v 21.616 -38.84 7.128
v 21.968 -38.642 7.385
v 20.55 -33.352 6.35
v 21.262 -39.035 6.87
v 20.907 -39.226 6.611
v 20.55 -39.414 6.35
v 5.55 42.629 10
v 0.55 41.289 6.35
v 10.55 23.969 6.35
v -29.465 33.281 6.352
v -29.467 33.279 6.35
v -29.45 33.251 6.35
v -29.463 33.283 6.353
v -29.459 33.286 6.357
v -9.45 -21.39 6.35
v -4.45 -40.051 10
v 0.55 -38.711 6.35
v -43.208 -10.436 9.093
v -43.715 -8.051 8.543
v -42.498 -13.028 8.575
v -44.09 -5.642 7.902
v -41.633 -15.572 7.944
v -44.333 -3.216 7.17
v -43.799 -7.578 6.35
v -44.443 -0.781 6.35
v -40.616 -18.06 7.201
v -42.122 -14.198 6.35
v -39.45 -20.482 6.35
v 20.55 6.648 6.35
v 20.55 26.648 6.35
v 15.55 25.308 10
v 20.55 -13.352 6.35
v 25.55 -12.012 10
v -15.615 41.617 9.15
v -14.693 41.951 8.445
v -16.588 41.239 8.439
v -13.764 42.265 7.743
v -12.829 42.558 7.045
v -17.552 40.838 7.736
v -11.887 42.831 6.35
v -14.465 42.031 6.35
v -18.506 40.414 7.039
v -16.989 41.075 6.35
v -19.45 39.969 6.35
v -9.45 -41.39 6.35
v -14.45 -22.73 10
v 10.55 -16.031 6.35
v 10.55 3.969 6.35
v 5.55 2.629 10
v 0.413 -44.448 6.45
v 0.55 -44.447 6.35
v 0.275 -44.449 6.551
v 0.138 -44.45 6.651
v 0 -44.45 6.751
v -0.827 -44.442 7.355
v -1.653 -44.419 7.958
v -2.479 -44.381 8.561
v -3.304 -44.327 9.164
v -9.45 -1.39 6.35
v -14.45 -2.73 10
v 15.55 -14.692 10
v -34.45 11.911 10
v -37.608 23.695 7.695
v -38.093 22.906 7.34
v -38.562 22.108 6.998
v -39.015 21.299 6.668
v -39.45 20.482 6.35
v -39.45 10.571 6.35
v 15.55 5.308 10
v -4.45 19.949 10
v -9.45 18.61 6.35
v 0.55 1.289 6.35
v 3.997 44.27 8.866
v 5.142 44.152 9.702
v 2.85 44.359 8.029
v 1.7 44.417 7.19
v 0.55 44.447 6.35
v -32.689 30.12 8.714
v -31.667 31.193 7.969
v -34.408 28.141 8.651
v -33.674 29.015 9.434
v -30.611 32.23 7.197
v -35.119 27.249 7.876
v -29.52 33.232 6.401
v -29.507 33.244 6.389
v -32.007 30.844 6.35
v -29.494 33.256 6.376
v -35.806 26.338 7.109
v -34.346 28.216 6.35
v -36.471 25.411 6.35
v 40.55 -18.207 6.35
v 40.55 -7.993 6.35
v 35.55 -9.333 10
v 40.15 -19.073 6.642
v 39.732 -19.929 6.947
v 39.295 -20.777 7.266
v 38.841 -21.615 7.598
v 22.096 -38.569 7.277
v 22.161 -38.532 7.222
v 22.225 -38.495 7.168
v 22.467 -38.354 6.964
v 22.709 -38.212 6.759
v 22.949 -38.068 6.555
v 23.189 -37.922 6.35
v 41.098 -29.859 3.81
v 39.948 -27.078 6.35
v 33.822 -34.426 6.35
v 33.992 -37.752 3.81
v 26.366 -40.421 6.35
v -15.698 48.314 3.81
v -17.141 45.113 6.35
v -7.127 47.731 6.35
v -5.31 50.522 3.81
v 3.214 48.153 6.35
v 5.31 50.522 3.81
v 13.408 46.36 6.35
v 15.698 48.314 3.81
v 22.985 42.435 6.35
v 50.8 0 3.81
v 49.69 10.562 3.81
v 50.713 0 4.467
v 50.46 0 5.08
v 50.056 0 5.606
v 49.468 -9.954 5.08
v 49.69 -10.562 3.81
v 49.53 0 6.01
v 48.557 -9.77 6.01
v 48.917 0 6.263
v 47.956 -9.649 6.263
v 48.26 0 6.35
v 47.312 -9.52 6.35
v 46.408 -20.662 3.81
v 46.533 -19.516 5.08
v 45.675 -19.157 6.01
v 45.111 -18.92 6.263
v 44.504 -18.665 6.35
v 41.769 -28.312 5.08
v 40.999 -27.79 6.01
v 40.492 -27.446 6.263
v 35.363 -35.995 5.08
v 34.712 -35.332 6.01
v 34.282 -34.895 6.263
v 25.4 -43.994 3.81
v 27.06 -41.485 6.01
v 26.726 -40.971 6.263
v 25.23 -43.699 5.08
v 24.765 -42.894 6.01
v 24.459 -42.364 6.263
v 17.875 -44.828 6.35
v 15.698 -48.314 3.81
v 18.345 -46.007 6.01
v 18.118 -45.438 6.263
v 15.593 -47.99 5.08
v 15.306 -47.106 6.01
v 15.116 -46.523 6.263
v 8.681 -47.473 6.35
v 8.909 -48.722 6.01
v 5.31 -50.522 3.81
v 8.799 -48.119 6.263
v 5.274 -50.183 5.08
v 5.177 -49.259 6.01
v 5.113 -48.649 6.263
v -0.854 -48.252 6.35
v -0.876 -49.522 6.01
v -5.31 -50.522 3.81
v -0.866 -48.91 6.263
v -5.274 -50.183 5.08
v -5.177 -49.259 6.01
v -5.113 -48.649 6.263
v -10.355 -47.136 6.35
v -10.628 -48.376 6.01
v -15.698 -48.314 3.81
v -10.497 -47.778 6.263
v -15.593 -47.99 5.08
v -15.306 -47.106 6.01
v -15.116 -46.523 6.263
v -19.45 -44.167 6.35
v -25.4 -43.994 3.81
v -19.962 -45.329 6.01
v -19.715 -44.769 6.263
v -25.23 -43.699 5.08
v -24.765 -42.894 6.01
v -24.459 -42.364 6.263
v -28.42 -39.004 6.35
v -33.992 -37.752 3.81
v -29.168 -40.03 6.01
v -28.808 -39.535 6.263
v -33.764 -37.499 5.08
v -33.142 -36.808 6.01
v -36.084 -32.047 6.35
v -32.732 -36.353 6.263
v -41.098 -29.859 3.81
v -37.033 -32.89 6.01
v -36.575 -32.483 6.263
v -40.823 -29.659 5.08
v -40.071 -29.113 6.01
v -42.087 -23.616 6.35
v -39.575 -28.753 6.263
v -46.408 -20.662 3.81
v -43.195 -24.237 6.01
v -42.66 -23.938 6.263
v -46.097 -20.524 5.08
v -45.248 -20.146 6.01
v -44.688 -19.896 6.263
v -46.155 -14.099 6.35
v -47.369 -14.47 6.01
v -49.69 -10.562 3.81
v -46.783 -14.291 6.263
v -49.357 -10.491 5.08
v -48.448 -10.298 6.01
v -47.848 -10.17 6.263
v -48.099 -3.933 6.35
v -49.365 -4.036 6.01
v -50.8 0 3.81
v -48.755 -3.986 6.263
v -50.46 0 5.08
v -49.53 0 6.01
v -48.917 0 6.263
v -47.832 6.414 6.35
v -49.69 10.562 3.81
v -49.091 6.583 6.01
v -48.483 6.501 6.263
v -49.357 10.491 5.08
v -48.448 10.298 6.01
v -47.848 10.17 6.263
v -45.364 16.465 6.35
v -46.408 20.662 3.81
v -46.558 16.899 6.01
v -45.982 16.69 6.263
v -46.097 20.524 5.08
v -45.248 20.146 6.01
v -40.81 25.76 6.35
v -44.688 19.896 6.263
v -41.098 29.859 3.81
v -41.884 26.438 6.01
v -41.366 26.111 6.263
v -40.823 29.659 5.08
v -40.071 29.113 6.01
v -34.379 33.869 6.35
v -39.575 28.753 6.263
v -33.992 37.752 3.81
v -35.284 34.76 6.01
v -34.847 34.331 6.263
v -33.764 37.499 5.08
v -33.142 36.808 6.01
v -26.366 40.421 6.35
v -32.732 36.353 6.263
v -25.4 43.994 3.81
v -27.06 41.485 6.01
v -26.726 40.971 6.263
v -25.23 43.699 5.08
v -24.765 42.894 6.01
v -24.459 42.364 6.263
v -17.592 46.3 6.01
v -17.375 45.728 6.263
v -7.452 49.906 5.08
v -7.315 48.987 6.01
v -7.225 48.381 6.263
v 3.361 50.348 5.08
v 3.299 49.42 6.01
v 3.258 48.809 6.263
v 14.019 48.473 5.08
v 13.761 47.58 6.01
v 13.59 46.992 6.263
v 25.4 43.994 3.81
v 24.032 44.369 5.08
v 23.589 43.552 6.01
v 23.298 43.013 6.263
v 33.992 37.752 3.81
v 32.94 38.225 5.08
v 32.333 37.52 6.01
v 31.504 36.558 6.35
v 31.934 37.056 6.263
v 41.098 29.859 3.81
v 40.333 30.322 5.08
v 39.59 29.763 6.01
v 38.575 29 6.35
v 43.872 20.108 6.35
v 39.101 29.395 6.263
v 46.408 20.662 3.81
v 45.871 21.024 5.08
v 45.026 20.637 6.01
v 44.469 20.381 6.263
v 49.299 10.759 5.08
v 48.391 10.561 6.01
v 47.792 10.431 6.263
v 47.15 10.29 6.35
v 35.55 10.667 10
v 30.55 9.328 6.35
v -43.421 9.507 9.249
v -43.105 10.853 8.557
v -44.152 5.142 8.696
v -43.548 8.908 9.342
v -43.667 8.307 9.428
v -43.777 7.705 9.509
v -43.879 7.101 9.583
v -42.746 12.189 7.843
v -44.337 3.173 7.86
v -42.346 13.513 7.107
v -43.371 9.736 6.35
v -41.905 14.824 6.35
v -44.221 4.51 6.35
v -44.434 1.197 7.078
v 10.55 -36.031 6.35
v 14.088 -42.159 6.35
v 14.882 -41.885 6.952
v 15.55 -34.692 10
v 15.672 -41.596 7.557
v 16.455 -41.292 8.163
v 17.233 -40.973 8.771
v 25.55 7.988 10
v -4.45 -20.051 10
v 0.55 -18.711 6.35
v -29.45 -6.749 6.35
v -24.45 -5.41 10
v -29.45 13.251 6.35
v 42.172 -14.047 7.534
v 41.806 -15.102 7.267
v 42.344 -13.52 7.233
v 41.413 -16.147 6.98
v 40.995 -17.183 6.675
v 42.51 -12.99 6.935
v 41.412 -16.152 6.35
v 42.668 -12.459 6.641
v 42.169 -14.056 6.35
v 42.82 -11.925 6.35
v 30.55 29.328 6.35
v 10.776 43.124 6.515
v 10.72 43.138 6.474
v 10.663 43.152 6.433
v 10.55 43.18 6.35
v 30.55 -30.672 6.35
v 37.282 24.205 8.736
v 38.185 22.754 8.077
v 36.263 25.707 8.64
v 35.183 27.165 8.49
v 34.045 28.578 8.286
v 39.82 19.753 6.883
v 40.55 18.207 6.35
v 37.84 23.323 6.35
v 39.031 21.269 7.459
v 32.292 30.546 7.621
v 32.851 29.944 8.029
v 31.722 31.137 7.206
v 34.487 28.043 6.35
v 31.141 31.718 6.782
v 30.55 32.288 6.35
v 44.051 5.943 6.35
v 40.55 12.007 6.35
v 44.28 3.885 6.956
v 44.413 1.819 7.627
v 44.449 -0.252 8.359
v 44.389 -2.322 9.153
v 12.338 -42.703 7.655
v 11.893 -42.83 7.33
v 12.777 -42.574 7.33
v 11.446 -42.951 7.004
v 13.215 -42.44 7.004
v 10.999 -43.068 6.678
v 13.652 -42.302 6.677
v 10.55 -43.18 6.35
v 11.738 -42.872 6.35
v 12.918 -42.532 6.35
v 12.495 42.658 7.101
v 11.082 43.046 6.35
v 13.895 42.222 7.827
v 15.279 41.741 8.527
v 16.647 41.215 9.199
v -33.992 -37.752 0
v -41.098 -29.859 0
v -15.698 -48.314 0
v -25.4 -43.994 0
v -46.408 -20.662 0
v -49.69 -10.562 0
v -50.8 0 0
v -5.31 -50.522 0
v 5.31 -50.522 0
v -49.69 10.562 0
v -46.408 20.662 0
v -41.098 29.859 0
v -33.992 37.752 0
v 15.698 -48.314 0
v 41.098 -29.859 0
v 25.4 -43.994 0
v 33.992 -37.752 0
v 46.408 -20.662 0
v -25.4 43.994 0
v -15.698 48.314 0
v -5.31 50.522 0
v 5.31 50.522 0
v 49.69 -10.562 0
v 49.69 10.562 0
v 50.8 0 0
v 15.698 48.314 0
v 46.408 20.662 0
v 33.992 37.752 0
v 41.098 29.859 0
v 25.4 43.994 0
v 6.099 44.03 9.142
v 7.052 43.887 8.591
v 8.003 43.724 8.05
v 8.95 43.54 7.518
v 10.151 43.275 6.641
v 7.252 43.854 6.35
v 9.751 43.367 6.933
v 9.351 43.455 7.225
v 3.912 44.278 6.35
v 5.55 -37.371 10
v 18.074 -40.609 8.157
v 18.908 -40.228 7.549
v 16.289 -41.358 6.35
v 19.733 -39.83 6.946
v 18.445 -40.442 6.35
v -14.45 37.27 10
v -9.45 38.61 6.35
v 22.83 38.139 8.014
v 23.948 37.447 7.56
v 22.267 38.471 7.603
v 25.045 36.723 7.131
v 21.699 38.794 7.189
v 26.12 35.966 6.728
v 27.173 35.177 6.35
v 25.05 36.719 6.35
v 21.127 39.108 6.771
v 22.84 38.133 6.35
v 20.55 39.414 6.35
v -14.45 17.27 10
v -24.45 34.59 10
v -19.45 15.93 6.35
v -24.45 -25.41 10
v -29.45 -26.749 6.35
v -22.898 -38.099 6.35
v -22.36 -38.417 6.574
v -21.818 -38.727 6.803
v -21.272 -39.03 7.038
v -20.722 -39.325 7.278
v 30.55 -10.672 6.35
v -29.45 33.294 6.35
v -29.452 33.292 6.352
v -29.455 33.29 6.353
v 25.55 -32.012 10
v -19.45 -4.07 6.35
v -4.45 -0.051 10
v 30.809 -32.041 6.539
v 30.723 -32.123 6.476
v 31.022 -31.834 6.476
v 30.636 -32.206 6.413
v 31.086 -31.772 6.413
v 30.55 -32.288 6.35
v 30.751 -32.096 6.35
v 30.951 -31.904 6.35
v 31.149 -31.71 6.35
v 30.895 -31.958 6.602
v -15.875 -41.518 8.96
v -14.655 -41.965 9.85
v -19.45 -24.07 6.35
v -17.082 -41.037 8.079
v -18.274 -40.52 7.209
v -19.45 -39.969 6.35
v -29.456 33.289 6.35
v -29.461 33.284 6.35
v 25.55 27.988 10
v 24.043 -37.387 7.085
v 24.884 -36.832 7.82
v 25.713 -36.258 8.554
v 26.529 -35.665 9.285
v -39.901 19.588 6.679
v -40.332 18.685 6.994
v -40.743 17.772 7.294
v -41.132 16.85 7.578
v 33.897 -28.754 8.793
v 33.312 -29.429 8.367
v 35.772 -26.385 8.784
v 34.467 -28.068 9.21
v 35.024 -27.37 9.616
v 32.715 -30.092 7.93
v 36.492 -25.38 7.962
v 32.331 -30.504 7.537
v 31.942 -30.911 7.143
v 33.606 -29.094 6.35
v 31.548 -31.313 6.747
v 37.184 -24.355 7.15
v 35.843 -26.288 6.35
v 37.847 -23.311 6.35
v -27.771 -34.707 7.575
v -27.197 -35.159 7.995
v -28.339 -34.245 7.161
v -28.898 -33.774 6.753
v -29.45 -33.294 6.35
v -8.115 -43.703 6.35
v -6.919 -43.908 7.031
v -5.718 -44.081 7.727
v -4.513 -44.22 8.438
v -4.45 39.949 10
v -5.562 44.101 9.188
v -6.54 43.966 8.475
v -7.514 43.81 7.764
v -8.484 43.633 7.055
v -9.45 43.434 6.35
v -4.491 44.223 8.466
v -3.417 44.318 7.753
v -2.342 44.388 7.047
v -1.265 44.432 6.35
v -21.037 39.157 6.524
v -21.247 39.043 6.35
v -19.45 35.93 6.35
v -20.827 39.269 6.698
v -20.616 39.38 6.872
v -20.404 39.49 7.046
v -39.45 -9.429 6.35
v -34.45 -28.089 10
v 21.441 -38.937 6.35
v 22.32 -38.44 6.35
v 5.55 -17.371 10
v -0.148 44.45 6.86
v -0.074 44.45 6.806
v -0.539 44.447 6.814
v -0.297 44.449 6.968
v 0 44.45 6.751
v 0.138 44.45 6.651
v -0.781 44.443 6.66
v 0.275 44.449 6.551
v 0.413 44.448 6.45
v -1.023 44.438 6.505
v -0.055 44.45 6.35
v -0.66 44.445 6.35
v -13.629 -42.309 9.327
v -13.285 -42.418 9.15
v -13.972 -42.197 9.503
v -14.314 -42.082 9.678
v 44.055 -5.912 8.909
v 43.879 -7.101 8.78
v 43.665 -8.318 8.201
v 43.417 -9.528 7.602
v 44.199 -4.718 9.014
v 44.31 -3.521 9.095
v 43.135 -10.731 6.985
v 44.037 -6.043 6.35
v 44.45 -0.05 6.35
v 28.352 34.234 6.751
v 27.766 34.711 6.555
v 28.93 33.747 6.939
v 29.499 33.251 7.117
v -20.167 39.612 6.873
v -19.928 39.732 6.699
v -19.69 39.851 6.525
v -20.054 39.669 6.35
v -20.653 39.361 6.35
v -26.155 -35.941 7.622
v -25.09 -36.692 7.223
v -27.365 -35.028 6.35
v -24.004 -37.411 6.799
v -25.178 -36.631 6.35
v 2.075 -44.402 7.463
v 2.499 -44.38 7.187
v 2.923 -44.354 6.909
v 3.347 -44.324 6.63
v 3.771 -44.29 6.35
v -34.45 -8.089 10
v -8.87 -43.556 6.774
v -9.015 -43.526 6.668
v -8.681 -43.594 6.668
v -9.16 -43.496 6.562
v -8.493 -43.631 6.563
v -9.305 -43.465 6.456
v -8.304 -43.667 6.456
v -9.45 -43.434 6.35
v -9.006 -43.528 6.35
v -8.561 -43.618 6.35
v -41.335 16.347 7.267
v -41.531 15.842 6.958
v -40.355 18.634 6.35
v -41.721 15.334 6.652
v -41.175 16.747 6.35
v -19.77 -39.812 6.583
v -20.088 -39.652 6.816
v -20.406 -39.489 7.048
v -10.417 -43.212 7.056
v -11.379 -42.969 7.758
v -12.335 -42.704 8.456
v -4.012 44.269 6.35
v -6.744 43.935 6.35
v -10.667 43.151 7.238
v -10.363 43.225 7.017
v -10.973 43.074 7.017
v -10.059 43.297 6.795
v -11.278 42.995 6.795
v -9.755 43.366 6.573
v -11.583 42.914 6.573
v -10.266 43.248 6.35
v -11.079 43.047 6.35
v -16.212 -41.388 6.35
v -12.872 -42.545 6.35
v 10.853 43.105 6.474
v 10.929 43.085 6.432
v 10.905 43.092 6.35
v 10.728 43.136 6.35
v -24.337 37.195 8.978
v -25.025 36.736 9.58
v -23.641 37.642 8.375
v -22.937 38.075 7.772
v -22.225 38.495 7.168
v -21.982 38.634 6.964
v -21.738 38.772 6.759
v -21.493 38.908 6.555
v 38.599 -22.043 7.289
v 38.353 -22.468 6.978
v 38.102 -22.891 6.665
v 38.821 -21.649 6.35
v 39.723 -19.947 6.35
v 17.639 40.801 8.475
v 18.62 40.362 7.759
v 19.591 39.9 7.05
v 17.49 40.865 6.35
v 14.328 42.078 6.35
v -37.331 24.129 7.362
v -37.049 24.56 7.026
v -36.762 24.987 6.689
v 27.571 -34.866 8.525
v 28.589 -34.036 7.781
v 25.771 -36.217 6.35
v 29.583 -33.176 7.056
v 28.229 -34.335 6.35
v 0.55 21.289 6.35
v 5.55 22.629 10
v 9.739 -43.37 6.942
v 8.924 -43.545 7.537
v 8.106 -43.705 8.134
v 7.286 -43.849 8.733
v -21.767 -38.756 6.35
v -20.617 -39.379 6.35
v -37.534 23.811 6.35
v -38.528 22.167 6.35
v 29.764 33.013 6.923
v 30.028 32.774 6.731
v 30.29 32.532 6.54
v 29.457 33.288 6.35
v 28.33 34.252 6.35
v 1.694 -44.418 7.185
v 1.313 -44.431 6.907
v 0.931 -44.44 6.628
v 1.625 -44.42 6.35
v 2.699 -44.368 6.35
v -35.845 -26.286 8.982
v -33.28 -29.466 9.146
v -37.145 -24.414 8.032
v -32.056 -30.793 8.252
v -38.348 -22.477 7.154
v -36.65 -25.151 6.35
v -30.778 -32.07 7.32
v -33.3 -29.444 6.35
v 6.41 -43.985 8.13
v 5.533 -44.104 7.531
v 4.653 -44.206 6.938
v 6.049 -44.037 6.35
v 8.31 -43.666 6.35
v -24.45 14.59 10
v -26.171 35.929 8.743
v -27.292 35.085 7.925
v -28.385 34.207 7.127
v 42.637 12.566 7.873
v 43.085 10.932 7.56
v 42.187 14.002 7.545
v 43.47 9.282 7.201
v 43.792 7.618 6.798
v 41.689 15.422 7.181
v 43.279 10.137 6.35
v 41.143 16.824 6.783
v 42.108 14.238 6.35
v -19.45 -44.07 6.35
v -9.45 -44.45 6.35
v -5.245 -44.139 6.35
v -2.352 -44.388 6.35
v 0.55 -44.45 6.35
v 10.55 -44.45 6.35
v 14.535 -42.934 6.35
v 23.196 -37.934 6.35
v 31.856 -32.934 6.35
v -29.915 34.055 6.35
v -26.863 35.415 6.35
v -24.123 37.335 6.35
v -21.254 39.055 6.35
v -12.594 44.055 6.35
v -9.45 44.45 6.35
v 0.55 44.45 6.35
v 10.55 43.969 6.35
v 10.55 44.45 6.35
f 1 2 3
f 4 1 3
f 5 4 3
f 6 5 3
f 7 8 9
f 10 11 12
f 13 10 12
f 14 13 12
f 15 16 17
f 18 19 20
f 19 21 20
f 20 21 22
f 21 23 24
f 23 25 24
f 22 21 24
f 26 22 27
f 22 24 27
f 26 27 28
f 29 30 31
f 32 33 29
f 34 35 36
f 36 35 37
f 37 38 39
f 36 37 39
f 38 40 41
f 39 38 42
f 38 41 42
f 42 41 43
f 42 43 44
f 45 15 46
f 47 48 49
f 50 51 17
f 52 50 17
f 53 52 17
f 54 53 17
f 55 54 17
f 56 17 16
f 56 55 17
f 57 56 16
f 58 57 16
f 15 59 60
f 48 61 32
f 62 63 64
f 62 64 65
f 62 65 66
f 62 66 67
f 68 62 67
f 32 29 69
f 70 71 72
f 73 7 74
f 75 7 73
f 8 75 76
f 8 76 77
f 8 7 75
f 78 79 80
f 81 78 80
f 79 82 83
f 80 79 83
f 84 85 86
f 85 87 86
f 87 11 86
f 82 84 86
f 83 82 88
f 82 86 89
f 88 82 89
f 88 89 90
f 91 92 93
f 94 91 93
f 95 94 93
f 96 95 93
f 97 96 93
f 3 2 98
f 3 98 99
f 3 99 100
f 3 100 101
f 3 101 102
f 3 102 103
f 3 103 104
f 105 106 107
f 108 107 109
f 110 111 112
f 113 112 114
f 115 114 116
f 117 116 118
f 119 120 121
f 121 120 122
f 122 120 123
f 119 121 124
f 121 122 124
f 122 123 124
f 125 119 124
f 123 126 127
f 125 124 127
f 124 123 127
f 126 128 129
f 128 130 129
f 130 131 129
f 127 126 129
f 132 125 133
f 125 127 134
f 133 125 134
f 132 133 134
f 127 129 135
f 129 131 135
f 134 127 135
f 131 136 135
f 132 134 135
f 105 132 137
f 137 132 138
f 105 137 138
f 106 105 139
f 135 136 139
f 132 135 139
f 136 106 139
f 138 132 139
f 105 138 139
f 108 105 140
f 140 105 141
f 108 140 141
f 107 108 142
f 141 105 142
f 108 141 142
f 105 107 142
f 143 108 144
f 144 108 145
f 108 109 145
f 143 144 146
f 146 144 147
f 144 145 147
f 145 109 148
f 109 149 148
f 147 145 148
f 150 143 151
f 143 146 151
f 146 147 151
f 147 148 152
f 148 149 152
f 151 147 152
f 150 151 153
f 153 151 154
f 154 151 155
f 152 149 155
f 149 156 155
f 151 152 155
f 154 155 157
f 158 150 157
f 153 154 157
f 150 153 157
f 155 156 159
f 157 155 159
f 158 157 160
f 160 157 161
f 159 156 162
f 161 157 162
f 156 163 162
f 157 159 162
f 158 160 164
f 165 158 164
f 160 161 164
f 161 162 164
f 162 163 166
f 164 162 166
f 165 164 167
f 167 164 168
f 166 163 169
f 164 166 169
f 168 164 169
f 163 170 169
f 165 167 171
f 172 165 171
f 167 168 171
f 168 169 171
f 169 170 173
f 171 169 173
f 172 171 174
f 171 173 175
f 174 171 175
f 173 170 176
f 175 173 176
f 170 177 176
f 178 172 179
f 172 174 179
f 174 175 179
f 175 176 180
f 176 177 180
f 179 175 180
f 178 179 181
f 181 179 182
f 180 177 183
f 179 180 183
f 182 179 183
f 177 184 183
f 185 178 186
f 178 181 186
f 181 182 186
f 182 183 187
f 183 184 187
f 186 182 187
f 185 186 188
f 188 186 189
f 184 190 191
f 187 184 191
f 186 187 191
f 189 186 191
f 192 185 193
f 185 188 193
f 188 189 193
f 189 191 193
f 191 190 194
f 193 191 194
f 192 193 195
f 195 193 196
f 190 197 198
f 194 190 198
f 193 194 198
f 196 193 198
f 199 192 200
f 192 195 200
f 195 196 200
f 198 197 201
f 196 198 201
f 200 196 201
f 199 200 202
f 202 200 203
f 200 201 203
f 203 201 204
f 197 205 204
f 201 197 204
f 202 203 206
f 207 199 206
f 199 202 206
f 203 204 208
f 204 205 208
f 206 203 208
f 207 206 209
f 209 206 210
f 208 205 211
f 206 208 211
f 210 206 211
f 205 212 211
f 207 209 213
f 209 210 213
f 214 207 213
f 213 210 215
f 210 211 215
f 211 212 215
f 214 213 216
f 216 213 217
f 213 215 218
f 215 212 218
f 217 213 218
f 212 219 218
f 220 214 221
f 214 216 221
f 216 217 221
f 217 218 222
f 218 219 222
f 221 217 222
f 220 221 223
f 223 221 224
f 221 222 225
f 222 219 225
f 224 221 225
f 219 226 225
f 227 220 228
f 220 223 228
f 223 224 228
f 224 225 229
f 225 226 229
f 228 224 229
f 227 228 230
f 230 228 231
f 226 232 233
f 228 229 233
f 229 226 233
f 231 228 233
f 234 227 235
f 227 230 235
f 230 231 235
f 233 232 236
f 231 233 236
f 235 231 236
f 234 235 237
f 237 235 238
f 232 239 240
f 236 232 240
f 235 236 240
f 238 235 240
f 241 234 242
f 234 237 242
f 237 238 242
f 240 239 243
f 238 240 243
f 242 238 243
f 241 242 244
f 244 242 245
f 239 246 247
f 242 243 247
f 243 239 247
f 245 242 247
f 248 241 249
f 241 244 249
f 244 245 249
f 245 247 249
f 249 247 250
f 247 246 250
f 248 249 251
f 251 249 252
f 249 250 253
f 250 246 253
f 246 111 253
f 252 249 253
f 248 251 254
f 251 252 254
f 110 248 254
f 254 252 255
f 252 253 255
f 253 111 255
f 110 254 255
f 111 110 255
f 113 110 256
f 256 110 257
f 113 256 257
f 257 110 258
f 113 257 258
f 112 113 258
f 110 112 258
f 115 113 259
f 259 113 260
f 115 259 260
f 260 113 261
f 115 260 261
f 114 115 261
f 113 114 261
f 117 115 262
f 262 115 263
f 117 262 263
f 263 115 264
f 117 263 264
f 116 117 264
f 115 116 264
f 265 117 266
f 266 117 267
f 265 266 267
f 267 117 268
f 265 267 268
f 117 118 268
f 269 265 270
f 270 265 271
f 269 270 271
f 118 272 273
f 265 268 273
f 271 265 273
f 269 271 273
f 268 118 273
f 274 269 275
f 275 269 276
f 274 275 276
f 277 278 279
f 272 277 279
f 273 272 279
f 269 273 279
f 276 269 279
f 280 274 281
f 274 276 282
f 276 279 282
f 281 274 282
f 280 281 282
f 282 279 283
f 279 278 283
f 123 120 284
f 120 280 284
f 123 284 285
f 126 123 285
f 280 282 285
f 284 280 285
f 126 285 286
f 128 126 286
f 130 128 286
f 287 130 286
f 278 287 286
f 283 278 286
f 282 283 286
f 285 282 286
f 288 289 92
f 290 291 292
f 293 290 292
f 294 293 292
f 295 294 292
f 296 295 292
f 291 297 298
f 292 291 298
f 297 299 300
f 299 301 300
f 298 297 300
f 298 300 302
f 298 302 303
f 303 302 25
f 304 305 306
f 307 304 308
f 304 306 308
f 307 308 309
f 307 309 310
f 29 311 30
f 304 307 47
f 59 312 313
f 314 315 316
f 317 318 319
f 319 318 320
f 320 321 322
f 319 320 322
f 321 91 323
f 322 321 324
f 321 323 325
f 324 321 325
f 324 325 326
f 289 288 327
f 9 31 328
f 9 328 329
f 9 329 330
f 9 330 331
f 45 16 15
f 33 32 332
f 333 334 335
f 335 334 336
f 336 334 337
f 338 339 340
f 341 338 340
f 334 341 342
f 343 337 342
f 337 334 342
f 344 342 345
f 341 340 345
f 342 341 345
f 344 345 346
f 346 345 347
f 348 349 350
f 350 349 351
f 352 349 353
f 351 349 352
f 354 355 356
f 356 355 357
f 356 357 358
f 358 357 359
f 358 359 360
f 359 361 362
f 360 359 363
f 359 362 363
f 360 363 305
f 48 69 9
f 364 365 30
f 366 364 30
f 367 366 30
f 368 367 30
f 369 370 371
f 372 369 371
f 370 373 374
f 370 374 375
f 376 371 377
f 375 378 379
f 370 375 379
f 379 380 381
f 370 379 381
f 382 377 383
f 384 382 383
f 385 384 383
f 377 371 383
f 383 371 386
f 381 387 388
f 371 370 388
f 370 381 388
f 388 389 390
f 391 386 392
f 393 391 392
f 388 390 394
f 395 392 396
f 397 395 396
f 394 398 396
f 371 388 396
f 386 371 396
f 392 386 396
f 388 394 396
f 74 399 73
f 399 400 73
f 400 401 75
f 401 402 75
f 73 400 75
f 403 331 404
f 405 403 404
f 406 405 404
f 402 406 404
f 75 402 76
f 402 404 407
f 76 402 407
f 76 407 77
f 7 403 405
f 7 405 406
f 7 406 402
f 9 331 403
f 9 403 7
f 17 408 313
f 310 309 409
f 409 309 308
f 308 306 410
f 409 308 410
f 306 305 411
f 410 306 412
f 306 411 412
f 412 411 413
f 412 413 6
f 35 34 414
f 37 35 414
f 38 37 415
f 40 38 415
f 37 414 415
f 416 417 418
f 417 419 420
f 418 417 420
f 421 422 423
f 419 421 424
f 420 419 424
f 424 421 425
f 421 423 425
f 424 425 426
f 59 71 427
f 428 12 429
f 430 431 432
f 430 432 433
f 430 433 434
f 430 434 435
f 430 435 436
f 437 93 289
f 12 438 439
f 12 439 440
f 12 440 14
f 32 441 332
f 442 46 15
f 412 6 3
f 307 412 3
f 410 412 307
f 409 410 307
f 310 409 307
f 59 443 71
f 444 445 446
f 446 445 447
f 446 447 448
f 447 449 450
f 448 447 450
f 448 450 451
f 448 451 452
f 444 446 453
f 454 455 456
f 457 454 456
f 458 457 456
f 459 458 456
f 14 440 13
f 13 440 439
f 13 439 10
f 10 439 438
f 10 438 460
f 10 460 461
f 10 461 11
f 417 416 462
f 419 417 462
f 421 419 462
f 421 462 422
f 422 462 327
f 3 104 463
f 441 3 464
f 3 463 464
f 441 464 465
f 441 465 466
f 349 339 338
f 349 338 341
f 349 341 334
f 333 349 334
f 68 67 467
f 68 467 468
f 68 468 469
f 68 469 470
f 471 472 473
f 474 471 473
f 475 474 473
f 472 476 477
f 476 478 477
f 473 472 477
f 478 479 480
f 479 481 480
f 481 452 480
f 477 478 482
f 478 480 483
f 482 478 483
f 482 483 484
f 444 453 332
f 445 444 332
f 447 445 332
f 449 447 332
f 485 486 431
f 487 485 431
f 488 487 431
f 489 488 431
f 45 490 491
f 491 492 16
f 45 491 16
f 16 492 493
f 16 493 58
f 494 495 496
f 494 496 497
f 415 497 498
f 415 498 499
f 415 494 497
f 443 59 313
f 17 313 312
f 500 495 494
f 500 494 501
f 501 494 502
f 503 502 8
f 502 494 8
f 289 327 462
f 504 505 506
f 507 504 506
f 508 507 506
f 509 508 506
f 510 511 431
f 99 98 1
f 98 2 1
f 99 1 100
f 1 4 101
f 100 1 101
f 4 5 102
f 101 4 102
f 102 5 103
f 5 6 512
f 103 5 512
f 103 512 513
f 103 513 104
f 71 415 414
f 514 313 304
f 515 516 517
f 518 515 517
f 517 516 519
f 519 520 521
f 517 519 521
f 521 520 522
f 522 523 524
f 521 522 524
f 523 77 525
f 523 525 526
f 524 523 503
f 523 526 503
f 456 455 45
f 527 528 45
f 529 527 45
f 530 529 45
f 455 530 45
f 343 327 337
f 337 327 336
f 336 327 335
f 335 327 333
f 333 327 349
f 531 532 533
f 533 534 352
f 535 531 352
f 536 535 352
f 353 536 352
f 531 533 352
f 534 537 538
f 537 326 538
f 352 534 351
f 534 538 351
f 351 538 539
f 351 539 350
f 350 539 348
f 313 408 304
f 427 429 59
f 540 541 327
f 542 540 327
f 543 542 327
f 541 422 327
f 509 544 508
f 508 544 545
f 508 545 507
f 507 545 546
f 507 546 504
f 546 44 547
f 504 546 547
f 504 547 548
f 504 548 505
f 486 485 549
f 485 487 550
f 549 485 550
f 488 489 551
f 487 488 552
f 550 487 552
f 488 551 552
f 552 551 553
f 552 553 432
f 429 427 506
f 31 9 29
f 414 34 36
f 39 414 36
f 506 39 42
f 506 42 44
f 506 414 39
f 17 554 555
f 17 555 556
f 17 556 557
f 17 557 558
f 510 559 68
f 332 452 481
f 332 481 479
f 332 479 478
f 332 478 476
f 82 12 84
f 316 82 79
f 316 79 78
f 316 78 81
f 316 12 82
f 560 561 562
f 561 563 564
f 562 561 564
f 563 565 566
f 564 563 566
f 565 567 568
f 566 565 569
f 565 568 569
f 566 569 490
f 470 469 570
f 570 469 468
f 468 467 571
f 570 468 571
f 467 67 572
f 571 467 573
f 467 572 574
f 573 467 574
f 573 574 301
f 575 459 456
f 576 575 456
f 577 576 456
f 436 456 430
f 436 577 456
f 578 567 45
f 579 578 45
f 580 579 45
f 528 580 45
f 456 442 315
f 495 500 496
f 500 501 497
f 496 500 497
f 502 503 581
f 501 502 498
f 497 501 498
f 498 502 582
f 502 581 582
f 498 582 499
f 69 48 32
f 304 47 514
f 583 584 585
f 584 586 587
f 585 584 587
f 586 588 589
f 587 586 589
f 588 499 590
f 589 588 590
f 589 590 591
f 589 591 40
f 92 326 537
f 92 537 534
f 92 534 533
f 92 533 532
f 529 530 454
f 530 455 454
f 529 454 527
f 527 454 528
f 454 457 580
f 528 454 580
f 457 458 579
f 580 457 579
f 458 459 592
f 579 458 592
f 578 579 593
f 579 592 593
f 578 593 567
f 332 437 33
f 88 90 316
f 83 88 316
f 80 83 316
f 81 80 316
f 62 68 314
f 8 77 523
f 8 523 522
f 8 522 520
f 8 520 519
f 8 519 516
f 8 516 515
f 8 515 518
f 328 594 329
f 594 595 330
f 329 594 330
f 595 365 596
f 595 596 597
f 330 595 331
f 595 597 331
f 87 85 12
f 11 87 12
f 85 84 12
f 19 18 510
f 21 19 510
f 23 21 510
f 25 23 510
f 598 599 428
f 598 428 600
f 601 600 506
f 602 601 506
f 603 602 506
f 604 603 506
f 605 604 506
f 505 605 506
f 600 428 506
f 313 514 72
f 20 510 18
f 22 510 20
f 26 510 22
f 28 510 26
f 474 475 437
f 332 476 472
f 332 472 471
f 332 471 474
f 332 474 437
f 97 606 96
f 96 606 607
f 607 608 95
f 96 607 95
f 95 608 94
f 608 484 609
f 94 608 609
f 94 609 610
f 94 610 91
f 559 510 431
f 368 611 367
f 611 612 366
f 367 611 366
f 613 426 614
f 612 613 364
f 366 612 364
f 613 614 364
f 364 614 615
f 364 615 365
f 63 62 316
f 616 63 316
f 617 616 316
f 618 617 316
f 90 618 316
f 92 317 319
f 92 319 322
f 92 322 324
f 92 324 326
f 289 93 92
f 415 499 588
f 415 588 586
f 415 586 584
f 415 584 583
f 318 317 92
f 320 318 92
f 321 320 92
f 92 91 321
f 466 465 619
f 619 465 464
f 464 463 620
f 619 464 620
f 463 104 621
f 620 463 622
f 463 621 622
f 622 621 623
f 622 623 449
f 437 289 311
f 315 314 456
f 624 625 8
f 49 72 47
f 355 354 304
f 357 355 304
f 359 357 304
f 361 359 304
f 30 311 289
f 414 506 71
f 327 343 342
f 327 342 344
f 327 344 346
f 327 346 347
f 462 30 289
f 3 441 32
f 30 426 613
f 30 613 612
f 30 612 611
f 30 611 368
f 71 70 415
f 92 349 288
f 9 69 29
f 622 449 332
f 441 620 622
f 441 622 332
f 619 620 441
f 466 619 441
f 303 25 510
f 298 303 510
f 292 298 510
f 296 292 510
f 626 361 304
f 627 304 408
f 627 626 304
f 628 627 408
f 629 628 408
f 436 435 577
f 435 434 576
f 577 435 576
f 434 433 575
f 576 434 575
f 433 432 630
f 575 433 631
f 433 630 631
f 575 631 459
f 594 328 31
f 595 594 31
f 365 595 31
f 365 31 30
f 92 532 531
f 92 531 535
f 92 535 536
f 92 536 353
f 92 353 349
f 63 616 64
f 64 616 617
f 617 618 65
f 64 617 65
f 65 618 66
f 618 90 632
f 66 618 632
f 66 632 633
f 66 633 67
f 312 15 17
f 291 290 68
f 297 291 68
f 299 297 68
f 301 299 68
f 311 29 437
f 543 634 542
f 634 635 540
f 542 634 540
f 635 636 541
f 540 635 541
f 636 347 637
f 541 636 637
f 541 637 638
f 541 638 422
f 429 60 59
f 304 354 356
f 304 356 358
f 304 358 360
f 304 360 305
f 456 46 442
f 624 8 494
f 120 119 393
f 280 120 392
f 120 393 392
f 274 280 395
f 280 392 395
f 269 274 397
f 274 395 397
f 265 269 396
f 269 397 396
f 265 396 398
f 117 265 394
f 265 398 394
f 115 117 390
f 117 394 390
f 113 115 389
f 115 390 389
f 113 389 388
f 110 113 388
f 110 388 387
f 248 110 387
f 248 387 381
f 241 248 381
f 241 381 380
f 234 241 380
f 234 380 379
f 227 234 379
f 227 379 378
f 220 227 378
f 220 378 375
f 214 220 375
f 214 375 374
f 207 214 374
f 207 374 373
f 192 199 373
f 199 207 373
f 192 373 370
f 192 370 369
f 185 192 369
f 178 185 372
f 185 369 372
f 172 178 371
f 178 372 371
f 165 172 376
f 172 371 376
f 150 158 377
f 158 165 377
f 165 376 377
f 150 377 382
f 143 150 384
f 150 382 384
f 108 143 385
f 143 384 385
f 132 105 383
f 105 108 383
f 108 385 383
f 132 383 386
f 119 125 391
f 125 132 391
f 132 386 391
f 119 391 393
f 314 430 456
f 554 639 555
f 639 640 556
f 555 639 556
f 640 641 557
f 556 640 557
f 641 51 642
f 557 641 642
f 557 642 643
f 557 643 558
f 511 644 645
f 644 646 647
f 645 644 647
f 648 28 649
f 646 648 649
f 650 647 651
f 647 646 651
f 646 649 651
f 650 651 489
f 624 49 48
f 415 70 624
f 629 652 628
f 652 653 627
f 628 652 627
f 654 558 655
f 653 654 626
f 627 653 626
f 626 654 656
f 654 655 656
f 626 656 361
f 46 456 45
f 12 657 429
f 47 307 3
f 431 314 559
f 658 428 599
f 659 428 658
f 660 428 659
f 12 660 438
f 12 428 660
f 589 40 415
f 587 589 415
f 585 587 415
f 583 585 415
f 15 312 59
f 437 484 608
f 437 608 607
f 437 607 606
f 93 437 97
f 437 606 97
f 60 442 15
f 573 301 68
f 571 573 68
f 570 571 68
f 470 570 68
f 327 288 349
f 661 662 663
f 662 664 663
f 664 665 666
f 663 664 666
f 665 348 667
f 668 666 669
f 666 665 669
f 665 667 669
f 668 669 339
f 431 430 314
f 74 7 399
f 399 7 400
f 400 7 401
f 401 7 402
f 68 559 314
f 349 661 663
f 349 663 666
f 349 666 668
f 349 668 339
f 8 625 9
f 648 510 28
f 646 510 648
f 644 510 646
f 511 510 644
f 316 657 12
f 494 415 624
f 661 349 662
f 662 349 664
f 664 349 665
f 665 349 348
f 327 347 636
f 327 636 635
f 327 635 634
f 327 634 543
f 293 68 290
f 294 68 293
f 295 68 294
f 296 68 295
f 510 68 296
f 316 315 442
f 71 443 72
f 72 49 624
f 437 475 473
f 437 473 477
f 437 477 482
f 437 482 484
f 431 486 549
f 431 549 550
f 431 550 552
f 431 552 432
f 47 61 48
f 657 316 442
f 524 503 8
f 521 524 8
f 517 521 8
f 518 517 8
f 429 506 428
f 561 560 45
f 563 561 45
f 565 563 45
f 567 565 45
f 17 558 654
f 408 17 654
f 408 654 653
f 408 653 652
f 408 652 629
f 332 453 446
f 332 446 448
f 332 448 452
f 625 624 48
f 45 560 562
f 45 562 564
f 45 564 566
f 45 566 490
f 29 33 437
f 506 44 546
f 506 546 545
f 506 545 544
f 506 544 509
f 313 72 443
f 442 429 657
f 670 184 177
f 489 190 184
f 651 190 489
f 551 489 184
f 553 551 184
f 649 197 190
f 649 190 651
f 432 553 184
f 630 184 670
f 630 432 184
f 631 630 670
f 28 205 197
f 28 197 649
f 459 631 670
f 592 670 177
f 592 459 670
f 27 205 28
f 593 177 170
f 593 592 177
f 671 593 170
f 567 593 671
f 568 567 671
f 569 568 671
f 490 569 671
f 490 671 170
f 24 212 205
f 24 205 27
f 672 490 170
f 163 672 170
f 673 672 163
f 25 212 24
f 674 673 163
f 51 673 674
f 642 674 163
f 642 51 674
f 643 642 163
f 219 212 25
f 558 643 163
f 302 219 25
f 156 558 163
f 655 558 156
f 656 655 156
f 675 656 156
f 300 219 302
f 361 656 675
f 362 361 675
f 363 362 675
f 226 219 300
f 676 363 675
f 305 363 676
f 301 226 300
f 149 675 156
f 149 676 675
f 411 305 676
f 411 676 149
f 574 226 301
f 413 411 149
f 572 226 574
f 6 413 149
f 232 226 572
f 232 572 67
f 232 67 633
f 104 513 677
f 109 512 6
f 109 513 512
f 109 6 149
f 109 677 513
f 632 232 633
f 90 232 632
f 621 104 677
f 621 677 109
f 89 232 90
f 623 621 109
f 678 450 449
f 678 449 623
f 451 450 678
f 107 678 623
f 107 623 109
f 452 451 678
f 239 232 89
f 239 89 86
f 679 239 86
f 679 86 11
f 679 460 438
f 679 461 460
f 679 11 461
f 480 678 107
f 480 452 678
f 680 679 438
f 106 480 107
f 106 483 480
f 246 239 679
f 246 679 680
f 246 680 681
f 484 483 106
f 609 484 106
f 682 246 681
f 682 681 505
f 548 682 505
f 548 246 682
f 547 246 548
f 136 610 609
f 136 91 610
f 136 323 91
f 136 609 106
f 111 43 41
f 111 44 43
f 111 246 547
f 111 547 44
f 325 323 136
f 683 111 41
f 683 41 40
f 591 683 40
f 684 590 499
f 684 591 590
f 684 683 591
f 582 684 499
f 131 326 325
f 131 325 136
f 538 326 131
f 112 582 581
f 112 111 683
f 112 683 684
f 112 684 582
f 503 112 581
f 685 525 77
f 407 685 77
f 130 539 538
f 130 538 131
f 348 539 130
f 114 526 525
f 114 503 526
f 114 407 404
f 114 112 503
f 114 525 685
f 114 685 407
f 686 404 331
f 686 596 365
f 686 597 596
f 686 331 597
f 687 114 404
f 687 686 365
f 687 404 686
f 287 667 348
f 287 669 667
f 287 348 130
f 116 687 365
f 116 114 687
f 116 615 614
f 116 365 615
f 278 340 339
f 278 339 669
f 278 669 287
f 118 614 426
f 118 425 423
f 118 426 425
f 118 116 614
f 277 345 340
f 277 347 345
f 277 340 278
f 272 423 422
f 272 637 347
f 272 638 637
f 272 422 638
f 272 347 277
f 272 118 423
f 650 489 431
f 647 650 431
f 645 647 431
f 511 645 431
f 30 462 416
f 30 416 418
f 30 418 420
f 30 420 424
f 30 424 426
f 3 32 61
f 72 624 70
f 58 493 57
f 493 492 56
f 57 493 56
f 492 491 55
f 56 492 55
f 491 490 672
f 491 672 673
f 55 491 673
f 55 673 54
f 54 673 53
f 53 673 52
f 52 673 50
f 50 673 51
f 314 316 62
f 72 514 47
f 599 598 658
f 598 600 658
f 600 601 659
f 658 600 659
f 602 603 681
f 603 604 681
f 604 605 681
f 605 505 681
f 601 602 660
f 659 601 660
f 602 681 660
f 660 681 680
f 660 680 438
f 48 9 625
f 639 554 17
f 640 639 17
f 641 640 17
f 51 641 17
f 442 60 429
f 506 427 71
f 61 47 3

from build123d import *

# Parameters (mm, degrees)
F0_R     = 50.8
F0_R_2   = 44.45
F1_DEPTH = 6.35
F2_DEPTH = 10
F7_DEPTH = 88.9
F9_DEPTH = 88.9


# Not quite as in the source:
# - a fillet or chamfer that OpenCascade refuses, or shapes differently, is made with other operations: its cross-section is extruded or revolved along the edge and cut away or added


with BuildPart() as f1:
    # F0 (on Top) → F1 (new body)
    with BuildSketch(Plane.XY):
        Circle(F0_R)
        Circle(F0_R_2, mode=Mode.SUBTRACT)
    extrude(amount=F1_DEPTH)

    # F0 (on Top) → F2 (join)
    with BuildSketch(Plane.XY):
        Circle(F0_R_2)
    extrude(amount=F2_DEPTH)

    # F6 (on face) → F7 (cut)
    with BuildSketch(Plane(origin=(0, -44.45, 0), x_dir=(-1, 0, 0), z_dir=(0, 1, 0))):
        Polygon((39.45, 6.35), (44.45, 10), (34.45, 10), align=None)
        Polygon((29.45, 6.35), (34.45, 10), (24.45, 10), align=None)
        Polygon((19.4500000001, 6.35), (24.45, 10), (14.4500000001, 10), align=None)
        Polygon((9.4500000001, 6.35), (14.4500000001, 10), (4.4500000002, 10), align=None)
        Polygon((-0.5499999998, 6.35), (4.4500000002, 10), (-5.5499999998, 10), align=None)
        Polygon((-10.5499999998, 6.35), (-5.5499999998, 10), (-15.5499999998, 10), align=None)
        Polygon((-20.5499999997, 6.35), (-15.5499999998, 10), (-25.5499999997, 10), align=None)
        Polygon((-30.5499999997, 6.35), (-25.5499999997, 10), (-35.5499999997, 10), align=None)
        Polygon((-40.5499999997, 6.35), (-35.5499999997, 10), (-45.5499999996, 10), align=None)
    extrude(amount=F7_DEPTH, mode=Mode.SUBTRACT)

    # F8 (on face) → F9 (cut)
    with BuildSketch(Plane(origin=(22.225, -38.4948291982, 0), x_dir=(0.8660254038, 0.5, 0), z_dir=(0.5, -0.8660254038, 0))):
        Polygon((-33.8791470656, 10), (-43.8791470656, 10), (-38.8791470656, 6.35), align=None)
        Polygon((-23.8791470657, 10), (-33.8791470656, 10), (-28.8791470656, 6.35), align=None)
        Polygon((-13.8791470657, 10), (-23.8791470657, 10), (-18.8791470657, 6.35), align=None)
        Polygon((-3.8791470657, 10), (-13.8791470657, 10), (-8.8791470657, 6.35), align=None)
        Polygon((6.1208529342, 10), (-3.8791470657, 10), (1.1208529342, 6.35), align=None)
        Polygon((16.1208529342, 10), (6.1208529342, 10), (11.1208529342, 6.35), align=None)
        Polygon((26.1208529341, 10), (16.1208529342, 10), (21.1208529342, 6.35), align=None)
        Polygon((36.1208529341, 10), (26.1208529341, 10), (31.1208529341, 6.35), align=None)
        Polygon((46.1208529341, 10), (36.1208529341, 10), (41.1208529341, 6.35), align=None)
    extrude(amount=-F9_DEPTH, mode=Mode.SUBTRACT)

    # F10: fillet of radius 2.54 on 1 edges, made by hand

    # F10_s1 → F10_t2 (revolve, cut)
    with BuildSketch(Plane.XZ):
        with BuildLine():
            ThreePointArc((50.8, 3.81), (50.0560512242, 5.6060512242), (48.26, 6.35))
            Line((48.26, 6.35), (50.8, 6.35))
            Line((50.8, 6.35), (50.8, 3.81))
        make_face()
    revolve(axis=Axis((0, 0, 6.35), (0, 0, -1)), mode=Mode.SUBTRACT)


solid = f1.part
